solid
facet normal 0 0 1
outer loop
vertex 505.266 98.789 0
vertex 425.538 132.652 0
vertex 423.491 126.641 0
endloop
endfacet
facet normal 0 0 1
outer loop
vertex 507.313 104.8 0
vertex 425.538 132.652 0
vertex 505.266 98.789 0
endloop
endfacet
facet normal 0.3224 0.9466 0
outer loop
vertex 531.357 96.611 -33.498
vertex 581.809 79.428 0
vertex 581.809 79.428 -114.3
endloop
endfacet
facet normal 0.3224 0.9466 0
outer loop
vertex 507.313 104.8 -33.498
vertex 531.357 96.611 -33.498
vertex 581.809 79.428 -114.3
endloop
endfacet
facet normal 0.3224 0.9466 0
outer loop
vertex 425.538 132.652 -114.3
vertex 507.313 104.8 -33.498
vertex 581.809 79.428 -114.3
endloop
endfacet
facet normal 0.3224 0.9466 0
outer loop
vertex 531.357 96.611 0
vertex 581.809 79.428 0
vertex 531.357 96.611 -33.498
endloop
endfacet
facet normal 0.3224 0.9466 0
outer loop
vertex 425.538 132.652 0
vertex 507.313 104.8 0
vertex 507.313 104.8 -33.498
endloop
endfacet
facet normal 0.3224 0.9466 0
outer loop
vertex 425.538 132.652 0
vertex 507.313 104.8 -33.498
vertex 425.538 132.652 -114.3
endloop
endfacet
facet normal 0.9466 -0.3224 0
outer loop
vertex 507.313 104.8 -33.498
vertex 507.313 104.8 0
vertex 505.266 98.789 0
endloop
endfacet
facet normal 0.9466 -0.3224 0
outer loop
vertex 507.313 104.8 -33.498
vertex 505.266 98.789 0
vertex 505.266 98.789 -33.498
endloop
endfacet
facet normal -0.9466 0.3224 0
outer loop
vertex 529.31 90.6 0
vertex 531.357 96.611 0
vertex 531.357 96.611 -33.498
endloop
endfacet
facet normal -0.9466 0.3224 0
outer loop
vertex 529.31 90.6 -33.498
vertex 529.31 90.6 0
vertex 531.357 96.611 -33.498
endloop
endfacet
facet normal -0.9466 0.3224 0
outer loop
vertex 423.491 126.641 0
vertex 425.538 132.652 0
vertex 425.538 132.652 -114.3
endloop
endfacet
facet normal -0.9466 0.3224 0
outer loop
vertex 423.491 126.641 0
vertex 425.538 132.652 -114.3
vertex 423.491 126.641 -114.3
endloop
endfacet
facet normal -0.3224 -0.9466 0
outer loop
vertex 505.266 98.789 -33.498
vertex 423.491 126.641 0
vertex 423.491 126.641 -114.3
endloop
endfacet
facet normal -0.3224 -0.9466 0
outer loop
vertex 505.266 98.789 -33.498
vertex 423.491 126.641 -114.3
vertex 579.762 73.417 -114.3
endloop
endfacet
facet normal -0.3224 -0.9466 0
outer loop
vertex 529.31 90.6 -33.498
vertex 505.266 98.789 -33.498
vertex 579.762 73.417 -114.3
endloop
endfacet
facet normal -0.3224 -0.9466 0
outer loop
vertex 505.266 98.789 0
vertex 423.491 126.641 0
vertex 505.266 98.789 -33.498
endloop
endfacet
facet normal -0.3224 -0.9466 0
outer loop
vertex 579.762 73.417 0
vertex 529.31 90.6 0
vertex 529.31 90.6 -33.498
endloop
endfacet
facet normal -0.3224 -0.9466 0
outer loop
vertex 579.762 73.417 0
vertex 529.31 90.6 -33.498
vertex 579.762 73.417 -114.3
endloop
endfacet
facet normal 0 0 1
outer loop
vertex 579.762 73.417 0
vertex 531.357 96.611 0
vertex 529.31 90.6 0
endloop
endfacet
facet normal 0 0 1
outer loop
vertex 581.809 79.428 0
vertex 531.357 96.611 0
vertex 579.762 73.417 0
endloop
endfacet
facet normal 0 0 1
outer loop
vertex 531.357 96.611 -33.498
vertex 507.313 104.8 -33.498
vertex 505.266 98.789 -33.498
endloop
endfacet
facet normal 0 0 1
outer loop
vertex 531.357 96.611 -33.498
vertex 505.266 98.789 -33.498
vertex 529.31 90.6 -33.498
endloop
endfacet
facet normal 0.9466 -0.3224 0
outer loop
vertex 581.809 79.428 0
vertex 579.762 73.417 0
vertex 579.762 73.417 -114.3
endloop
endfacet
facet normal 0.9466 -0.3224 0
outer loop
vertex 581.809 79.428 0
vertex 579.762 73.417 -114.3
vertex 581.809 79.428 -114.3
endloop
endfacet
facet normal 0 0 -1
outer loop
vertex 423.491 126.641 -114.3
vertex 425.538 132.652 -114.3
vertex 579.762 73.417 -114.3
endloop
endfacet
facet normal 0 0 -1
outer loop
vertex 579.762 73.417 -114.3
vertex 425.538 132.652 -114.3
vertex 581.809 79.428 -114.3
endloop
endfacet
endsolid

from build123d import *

# Parameters (mm, degrees)
BOSS_EXTRUDE2_DEPTH = 114.3
CUT_EXTRUDE1_REACH  = 541.354
SKETCH2_W           = 25.4
SKETCH2_H           = 40.79687197


with BuildPart() as part:
    # Sketch1 → Boss-Extrude2 (new body)
    with BuildSketch(Plane.XY):
        Polygon((581.808782497, 79.428009058), (425.537875129, 132.65163668), (423.490637562, 126.640703446), (579.76154493, 73.417075823), align=None)
    extrude(amount=-BOSS_EXTRUDE2_DEPTH)

    # Sketch2 → Cut-Extrude1 (cut, up to next)
    with BuildSketch(Plane(origin=(84.714294761, 248.731255285, 0), x_dir=(0.9466036589314765, -0.3223996167763558, 0), z_dir=(0.32239961677635576, 0.9466036589314764, 0)), mode=Mode.PRIVATE) as cut_extrude1_sk1:
        with Locations((459.137216198, 13.100047516)):
            Rectangle(SKETCH2_W, SKETCH2_H)
    cut_extrude1_tool1 = extrude(cut_extrude1_sk1.sketch, amount=-CUT_EXTRUDE1_REACH, mode=Mode.PRIVATE) & part.part
    add(cut_extrude1_tool1.solids().sort_by_distance((519.335264, 100.705593, -13.100048))[0], mode=Mode.SUBTRACT)


solid = part.part
